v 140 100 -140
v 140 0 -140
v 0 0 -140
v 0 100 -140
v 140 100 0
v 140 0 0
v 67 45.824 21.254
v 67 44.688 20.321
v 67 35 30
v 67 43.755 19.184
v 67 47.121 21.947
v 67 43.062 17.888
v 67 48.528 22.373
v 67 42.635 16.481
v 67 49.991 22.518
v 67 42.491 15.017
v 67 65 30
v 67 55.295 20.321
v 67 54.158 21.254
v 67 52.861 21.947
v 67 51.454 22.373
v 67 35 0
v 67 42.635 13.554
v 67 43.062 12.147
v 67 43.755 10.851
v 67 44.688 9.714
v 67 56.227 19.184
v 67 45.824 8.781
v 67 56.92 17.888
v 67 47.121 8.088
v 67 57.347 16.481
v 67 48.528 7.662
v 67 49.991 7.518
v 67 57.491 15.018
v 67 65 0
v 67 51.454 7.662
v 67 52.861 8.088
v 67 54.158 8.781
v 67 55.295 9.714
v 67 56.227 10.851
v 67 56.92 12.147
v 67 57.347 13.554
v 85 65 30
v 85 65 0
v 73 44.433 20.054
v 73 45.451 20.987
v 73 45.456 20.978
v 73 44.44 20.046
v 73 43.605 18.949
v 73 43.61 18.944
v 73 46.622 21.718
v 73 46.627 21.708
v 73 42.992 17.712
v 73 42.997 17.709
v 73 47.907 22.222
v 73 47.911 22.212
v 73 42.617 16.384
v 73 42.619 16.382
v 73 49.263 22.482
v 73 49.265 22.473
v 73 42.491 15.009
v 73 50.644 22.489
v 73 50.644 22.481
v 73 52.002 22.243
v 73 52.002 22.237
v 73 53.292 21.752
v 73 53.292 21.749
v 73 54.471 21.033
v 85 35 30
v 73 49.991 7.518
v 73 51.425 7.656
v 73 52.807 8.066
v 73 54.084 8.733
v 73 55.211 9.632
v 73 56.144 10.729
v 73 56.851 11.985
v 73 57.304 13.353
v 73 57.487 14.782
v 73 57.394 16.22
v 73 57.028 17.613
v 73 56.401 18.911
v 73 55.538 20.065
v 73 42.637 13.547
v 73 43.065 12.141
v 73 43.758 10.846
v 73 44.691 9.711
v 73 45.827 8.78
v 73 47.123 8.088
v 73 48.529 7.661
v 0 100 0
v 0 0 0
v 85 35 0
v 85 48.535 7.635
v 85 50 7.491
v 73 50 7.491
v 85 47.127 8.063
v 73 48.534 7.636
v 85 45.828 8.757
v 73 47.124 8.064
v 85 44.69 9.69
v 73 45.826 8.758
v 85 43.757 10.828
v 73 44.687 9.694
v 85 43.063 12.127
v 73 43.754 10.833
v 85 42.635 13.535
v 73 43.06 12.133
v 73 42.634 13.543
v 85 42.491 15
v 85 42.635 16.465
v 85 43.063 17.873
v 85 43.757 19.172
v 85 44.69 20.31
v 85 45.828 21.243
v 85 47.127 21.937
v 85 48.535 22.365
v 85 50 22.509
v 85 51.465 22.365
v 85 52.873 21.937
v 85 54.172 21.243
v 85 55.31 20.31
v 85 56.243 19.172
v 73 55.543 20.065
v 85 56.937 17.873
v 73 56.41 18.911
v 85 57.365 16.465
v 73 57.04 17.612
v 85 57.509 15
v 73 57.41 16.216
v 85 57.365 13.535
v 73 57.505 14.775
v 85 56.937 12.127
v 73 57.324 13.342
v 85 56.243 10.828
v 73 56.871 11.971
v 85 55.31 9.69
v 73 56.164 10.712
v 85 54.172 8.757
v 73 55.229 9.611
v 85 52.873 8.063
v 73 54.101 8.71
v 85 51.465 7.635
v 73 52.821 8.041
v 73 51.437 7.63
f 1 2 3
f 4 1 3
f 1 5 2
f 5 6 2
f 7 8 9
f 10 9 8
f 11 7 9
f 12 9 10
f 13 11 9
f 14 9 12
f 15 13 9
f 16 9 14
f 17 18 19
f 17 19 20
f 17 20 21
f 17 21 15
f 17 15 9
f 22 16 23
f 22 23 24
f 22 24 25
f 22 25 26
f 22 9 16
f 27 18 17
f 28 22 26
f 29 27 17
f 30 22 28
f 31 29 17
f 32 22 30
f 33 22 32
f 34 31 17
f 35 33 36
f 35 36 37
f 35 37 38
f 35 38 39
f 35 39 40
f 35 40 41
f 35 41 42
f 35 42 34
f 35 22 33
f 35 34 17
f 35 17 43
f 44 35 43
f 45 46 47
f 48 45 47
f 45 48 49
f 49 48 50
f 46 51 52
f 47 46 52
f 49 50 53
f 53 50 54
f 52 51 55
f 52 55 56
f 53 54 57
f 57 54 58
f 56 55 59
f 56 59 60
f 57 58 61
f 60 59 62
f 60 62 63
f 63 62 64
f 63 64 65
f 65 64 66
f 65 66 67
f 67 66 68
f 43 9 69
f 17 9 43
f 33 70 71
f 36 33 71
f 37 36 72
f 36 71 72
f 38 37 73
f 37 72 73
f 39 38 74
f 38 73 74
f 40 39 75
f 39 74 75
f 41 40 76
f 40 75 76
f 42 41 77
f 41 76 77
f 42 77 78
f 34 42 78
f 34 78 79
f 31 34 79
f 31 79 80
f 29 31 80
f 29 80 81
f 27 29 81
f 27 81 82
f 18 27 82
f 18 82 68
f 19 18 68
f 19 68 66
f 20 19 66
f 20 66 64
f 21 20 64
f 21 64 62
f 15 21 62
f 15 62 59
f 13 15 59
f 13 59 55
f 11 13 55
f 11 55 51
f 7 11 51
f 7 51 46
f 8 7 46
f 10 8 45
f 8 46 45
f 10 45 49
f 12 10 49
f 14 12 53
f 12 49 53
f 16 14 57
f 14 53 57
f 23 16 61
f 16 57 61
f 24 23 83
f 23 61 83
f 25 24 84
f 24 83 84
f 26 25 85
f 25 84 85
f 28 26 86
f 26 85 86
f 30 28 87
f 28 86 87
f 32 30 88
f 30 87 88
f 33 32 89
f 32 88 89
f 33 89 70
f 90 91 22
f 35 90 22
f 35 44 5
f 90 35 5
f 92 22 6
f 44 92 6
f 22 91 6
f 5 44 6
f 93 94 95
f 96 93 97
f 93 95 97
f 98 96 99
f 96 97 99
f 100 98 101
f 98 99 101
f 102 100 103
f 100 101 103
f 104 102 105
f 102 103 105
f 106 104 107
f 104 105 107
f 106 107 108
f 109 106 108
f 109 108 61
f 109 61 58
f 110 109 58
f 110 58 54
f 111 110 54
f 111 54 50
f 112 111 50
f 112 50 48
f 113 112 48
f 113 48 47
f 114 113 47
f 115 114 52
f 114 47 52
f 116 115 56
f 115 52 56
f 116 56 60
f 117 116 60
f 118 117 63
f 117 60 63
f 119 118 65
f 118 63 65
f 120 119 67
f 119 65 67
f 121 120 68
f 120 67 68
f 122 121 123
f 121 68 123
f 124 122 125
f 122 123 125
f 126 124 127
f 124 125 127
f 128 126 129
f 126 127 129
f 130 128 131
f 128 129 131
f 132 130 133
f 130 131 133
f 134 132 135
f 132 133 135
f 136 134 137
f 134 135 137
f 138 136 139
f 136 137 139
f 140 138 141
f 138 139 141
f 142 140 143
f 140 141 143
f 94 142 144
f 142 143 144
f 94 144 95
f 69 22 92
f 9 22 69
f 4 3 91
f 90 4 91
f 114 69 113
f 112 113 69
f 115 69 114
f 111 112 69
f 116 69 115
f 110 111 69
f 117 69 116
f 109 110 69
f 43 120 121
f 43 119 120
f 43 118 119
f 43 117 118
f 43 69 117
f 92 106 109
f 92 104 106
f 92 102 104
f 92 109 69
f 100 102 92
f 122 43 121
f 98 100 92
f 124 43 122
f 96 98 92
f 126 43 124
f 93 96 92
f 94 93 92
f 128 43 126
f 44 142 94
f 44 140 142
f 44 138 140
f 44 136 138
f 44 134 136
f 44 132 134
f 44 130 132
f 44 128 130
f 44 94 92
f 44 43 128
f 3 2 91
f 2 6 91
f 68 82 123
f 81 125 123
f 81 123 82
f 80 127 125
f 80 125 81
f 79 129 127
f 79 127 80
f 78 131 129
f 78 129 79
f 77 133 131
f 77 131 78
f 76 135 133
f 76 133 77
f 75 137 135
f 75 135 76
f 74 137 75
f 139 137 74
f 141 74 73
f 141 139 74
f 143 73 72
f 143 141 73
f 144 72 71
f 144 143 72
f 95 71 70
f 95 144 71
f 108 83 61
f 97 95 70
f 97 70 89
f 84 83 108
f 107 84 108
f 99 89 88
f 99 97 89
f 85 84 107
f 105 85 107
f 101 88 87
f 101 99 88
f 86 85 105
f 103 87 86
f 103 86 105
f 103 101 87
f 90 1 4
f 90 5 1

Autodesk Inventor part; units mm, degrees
ref_plane "YZ Plane" through (0, 0, 0) normal (1, 0, 0) x (0, 1, 0)
ref_plane "XZ Plane" through (0, 0, 0) normal (0, 1, 0) x (-1, 0, 0)
ref_plane "XY Plane" through (0, 0, 0) normal (0, 0, 1) x (1, 0, 0)
sketch "Sketch1" plane through (0, 0, 0) normal (1, 0, 0) x (0, 1, 0)
  point P0 (0, 0)
sketch "Sketch2" plane through (0, 0, 0) normal (0, 1, 0) x (-1, 0, 0)
  line L0 (0, 0) -> (-140, 0)
  line L1 (-140, 0) -> (-140, -140)
  line L2 (-140, -140) -> (0, -140)
  line L3 (0, -140) -> (0, 0)
  dimension "d0" = 140
  dimension "d1" = 140
extrude "Extrusion1" add sketch "Sketch2" along normal blind 100
sketch "Sketch3" plane through (0, 0, 0) normal (0, 0, 1) x (1, 0, 0)
  line L0 (140, 100) -> (0, 100) projected
  line L1 (140, 0) -> (140, 100) projected
  line L2 (140, 0) -> (0, 0) projected
  line L3 (70, 35) -> (73, 35)
  line L4 (73, 35) -> (67, 35)
  line L5 (67, 35) -> (67, 65)
  line L6 (67, 65) -> (73, 65)
  line L7 (73, 65) -> (73, 35)
extrude "Extrusion2" add sketch "Sketch3" along normal blind 30
sketch "Sketch4" plane through (73, 35, 0) normal (1, 0, 0) x (0, 0, -1)
  line L0 (0, -35) -> (0, 65) projected
  circle A0 centre (-15.0175, 14.9912) radius 7.5
  point P0 (-30, 30)
  dimension "d10" = 15
extrude "Extrusion3" cut sketch "Sketch4" against normal blind 30
sketch "Sketch5" plane through (73, 35, 0) normal (1, 0, 0) x (0, 0, -1)
  line L0 (0, 30) -> (0, 0) projected
  line L1 (-30, 30) -> (0, 30)
  line L2 (0, 30) -> (0, 0)
  line L3 (0, 0) -> (-30, 0)
  line L4 (-30, 0) -> (-30, 30)
  circle A0 centre (-15, 15) radius 7.5088
  point P0 (0, -35)
extrude "Extrusion4" add sketch "Sketch5" along normal blind 12
equation "\"BendRadius\" = Thickness"
equation "\"BendReliefWidth\" = Thickness"
equation "\"BendReliefDepth\" = 0.5 * Thickness"
equation "\"CornerReliefSize\" = 4 * Thickness"
equation "\"MinimumRemnant\" = 2 * Thickness"
equation "\"TransitionRadius\" = BendRadius"
equation "\"JacobiRadiusSize\" = BendRadius"
equation "\"GapSize\" = Thickness"
equation "\"Thickness\" = 0.5"
properties part number "Balancin"
